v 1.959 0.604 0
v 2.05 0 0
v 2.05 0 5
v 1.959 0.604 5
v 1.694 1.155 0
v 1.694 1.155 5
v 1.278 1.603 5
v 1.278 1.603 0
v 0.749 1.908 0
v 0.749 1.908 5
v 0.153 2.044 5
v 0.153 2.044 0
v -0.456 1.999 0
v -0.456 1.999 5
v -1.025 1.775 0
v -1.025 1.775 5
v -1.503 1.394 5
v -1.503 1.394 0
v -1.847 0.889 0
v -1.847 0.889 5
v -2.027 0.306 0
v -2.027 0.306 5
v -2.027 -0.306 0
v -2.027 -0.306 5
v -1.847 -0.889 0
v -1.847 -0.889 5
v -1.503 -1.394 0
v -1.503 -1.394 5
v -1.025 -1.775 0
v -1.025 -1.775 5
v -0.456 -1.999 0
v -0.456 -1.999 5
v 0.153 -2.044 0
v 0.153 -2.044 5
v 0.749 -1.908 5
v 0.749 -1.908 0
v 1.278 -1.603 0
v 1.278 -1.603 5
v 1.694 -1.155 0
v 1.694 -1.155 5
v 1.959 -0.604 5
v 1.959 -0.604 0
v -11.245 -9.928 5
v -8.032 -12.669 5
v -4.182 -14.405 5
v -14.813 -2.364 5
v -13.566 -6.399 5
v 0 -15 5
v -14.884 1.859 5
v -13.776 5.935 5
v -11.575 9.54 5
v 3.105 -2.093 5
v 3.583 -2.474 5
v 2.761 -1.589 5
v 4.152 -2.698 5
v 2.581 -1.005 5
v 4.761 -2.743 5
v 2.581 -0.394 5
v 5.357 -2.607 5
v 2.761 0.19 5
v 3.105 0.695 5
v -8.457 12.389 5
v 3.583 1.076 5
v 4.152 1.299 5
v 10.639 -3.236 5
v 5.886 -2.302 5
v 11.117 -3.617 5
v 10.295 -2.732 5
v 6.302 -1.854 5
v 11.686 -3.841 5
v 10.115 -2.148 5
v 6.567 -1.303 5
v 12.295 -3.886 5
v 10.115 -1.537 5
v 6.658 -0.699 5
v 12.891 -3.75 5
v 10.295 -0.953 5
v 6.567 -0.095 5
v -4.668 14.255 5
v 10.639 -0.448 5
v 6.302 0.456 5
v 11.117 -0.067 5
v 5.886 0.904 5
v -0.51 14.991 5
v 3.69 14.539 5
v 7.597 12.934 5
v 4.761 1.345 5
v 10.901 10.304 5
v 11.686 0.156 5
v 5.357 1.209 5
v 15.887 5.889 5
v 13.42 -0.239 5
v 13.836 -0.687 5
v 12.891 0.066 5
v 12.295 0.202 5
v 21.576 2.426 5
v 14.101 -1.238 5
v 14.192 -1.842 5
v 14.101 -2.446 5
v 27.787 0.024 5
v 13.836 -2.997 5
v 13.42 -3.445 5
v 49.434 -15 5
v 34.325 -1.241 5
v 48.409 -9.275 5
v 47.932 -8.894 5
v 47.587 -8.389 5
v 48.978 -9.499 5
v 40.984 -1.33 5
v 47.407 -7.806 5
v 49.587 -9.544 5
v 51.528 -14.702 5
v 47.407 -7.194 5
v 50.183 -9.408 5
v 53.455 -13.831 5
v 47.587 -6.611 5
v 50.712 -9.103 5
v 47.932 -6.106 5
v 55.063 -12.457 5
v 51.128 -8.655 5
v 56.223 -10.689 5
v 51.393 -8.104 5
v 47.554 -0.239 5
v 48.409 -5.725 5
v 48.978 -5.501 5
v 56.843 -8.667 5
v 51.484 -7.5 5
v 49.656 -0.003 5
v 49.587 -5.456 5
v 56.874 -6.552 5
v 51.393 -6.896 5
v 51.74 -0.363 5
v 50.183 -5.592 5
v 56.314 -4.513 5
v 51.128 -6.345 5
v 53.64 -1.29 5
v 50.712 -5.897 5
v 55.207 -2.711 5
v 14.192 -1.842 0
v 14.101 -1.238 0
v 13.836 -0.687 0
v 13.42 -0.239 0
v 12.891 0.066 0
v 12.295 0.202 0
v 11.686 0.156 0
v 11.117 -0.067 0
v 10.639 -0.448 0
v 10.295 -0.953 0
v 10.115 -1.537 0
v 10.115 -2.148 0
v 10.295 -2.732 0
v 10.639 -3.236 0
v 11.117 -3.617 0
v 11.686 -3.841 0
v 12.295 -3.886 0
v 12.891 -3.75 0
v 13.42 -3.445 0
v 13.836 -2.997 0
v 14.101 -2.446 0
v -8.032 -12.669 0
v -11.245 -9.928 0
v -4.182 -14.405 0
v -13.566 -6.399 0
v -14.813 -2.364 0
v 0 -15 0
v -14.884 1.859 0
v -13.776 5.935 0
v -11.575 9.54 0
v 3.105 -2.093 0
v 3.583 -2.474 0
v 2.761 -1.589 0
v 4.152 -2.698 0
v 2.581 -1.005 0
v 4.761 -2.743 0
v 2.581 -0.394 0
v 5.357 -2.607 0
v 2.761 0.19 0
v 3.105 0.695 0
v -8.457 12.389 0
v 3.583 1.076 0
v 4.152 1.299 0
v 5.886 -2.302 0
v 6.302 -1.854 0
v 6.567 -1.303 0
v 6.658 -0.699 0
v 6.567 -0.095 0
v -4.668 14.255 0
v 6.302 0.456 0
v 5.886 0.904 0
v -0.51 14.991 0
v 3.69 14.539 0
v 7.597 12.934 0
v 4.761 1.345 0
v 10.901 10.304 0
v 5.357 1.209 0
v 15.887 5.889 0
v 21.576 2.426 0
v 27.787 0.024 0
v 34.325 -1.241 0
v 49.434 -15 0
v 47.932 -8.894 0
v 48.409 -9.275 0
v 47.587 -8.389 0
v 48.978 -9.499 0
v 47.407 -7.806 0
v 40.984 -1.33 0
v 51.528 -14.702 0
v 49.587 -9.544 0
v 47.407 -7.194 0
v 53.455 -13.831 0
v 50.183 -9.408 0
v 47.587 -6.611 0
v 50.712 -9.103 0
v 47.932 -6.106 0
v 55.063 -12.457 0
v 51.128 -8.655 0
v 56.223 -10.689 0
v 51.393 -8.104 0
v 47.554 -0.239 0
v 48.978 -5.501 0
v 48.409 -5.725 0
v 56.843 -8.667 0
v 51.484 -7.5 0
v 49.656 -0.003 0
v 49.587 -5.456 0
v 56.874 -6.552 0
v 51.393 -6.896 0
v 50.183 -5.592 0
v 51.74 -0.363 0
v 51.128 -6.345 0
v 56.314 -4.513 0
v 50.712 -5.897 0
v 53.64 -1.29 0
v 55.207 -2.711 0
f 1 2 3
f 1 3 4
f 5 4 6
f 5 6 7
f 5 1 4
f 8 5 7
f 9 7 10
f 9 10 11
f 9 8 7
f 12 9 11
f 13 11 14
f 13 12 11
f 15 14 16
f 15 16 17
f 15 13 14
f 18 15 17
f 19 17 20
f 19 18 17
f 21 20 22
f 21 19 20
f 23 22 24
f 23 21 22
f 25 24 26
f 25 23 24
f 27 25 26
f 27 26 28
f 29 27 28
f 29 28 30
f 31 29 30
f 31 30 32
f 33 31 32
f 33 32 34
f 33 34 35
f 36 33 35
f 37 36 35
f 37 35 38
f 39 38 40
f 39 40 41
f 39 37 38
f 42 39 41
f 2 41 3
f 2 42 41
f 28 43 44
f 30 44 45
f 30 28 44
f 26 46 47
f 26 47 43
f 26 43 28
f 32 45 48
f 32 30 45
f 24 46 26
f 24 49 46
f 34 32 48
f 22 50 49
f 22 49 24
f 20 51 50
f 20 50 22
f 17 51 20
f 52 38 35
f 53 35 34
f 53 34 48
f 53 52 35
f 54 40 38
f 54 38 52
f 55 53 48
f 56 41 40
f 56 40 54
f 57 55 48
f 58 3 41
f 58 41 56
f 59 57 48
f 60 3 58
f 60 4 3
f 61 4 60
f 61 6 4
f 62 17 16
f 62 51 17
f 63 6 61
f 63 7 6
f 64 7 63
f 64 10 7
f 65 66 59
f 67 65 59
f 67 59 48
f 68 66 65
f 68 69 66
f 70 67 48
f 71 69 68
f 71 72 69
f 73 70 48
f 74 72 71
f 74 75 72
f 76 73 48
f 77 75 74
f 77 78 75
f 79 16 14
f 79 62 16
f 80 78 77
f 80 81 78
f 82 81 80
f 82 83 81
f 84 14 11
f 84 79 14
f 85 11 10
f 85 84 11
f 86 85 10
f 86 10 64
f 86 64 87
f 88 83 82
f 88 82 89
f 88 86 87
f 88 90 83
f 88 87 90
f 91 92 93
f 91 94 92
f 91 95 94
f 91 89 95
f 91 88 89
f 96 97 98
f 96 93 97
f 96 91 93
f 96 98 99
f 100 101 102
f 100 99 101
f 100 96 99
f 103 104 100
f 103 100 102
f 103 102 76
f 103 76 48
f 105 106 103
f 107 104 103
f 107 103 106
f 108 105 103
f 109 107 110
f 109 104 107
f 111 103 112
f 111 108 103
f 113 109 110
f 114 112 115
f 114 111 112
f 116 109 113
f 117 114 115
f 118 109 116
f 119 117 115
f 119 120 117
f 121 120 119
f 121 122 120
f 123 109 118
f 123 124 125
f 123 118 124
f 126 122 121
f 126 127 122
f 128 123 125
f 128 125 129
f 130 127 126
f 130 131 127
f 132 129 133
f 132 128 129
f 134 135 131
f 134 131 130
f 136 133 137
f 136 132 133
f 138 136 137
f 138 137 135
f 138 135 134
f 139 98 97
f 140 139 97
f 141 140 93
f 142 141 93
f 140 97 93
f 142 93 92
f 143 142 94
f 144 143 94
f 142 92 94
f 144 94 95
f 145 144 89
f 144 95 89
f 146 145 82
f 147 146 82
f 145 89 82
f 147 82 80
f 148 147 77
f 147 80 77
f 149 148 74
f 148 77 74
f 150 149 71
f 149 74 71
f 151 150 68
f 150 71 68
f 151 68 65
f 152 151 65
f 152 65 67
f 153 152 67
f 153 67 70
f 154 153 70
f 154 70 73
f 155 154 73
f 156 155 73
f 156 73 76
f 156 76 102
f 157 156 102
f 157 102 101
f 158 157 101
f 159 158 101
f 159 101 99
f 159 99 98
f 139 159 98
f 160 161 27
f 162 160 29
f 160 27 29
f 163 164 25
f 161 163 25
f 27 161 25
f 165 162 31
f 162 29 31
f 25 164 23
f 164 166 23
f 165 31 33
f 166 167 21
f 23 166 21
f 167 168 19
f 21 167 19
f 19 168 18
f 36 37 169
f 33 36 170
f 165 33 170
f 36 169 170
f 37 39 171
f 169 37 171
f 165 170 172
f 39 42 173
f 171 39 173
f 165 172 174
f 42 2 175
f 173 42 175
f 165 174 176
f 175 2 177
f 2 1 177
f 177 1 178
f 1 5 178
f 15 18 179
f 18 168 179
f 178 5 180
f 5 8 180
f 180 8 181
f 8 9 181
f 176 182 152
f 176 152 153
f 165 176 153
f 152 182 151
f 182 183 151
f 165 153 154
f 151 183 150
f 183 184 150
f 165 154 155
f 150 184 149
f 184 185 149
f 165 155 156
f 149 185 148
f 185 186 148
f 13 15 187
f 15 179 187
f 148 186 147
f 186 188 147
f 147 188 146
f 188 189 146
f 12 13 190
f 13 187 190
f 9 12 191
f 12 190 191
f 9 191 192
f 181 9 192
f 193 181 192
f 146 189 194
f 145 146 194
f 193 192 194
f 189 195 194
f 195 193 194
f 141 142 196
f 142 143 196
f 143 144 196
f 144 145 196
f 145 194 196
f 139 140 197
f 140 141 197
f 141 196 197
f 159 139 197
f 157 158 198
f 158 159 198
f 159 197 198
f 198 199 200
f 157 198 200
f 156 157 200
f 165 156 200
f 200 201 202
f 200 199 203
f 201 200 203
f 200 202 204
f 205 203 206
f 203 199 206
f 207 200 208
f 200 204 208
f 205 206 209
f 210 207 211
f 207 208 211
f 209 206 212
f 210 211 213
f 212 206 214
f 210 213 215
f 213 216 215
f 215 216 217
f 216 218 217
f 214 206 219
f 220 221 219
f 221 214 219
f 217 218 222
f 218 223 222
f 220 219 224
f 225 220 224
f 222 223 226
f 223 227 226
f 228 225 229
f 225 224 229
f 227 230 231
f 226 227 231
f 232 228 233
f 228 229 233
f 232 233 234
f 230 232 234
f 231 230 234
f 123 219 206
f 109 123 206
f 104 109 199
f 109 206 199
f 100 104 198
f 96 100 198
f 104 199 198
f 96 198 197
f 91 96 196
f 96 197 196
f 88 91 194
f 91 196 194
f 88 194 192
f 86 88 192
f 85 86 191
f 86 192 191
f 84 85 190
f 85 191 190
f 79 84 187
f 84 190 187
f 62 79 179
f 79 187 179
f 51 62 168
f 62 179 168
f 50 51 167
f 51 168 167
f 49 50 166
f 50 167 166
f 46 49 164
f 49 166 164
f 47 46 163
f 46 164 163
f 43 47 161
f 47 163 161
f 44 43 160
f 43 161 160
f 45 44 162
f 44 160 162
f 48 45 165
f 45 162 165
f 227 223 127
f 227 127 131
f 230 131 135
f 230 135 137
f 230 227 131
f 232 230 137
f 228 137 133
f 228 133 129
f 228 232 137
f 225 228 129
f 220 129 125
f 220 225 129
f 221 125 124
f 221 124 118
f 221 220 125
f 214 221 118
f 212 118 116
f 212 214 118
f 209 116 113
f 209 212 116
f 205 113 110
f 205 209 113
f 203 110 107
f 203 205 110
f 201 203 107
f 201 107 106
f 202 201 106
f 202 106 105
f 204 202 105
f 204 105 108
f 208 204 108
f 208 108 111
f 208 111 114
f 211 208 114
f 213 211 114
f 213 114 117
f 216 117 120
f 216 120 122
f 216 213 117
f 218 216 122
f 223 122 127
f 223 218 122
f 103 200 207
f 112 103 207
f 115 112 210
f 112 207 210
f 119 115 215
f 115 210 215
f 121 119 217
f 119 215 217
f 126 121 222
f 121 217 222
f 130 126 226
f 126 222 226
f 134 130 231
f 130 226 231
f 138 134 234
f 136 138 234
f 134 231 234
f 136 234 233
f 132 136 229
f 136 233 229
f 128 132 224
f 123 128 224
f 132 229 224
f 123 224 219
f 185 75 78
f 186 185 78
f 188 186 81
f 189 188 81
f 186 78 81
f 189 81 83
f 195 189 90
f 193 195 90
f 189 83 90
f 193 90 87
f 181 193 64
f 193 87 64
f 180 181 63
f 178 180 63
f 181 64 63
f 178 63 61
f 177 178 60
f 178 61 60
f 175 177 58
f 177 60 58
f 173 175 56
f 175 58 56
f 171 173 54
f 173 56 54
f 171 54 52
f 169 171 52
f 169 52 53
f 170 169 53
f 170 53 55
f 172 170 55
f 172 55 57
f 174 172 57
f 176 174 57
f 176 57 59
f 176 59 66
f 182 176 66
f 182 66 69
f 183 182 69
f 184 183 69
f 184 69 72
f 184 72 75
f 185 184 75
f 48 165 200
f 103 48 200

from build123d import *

# Parameters (mm, degrees)
SCHIZZO1_R                   = 2.05
ESTRUSIONE_ESTRUSIONE1_DEPTH = 5
CUT_EXTRUDE1_REACH           = 7
SKETCH1_R                    = 2.05


with BuildPart() as part:
    # Schizzo1 → Estrusione-Estrusione1 (new body)
    with BuildSketch(Plane.XY):
        with BuildLine():
            Line((0, -15), (49.434299833, -15))
            ThreePointArc((49.434299833, -15), (56.874189574, -6.552349937), (47.554189972, -0.239477504))
            ThreePointArc((47.554189972, -0.239477504), (27.787162994, 0.02445935), (10.90104019, 10.30375285))
            ThreePointArc((10.90104019, 10.30375285), (-13.775998925, 5.934800218), (0, -15))
        make_face()
        Circle(SCHIZZO1_R, mode=Mode.SUBTRACT)
        with Locations((49.434299833, -7.5)):
            Circle(SCHIZZO1_R, mode=Mode.SUBTRACT)
    extrude(amount=ESTRUSIONE_ESTRUSIONE1_DEPTH)

    # Sketch1 → Cut-Extrude1 (cut, up to next)
    with BuildSketch(Plane.XY.offset(5), mode=Mode.PRIVATE) as cut_extrude1_sk1:
        with Locations((4.608166562, -0.699135)):
            Circle(SKETCH1_R)
    cut_extrude1_tool1 = extrude(cut_extrude1_sk1.sketch, amount=-CUT_EXTRUDE1_REACH, mode=Mode.PRIVATE) & part.part
    add(cut_extrude1_tool1.solids().sort_by_distance((4.608167, -0.699135, 5))[0], mode=Mode.SUBTRACT)
    # Sketch1 → Cut-Extrude1 (cut, up to next)
    with BuildSketch(Plane.XY.offset(5), mode=Mode.PRIVATE) as cut_extrude1_sk2:
        with Locations((12.141953856, -1.842135)):
            Circle(SKETCH1_R)
    cut_extrude1_tool2 = extrude(cut_extrude1_sk2.sketch, amount=-CUT_EXTRUDE1_REACH, mode=Mode.PRIVATE) & part.part
    add(cut_extrude1_tool2.solids().sort_by_distance((12.141954, -1.842135, 5))[0], mode=Mode.SUBTRACT)


solid = part.part
